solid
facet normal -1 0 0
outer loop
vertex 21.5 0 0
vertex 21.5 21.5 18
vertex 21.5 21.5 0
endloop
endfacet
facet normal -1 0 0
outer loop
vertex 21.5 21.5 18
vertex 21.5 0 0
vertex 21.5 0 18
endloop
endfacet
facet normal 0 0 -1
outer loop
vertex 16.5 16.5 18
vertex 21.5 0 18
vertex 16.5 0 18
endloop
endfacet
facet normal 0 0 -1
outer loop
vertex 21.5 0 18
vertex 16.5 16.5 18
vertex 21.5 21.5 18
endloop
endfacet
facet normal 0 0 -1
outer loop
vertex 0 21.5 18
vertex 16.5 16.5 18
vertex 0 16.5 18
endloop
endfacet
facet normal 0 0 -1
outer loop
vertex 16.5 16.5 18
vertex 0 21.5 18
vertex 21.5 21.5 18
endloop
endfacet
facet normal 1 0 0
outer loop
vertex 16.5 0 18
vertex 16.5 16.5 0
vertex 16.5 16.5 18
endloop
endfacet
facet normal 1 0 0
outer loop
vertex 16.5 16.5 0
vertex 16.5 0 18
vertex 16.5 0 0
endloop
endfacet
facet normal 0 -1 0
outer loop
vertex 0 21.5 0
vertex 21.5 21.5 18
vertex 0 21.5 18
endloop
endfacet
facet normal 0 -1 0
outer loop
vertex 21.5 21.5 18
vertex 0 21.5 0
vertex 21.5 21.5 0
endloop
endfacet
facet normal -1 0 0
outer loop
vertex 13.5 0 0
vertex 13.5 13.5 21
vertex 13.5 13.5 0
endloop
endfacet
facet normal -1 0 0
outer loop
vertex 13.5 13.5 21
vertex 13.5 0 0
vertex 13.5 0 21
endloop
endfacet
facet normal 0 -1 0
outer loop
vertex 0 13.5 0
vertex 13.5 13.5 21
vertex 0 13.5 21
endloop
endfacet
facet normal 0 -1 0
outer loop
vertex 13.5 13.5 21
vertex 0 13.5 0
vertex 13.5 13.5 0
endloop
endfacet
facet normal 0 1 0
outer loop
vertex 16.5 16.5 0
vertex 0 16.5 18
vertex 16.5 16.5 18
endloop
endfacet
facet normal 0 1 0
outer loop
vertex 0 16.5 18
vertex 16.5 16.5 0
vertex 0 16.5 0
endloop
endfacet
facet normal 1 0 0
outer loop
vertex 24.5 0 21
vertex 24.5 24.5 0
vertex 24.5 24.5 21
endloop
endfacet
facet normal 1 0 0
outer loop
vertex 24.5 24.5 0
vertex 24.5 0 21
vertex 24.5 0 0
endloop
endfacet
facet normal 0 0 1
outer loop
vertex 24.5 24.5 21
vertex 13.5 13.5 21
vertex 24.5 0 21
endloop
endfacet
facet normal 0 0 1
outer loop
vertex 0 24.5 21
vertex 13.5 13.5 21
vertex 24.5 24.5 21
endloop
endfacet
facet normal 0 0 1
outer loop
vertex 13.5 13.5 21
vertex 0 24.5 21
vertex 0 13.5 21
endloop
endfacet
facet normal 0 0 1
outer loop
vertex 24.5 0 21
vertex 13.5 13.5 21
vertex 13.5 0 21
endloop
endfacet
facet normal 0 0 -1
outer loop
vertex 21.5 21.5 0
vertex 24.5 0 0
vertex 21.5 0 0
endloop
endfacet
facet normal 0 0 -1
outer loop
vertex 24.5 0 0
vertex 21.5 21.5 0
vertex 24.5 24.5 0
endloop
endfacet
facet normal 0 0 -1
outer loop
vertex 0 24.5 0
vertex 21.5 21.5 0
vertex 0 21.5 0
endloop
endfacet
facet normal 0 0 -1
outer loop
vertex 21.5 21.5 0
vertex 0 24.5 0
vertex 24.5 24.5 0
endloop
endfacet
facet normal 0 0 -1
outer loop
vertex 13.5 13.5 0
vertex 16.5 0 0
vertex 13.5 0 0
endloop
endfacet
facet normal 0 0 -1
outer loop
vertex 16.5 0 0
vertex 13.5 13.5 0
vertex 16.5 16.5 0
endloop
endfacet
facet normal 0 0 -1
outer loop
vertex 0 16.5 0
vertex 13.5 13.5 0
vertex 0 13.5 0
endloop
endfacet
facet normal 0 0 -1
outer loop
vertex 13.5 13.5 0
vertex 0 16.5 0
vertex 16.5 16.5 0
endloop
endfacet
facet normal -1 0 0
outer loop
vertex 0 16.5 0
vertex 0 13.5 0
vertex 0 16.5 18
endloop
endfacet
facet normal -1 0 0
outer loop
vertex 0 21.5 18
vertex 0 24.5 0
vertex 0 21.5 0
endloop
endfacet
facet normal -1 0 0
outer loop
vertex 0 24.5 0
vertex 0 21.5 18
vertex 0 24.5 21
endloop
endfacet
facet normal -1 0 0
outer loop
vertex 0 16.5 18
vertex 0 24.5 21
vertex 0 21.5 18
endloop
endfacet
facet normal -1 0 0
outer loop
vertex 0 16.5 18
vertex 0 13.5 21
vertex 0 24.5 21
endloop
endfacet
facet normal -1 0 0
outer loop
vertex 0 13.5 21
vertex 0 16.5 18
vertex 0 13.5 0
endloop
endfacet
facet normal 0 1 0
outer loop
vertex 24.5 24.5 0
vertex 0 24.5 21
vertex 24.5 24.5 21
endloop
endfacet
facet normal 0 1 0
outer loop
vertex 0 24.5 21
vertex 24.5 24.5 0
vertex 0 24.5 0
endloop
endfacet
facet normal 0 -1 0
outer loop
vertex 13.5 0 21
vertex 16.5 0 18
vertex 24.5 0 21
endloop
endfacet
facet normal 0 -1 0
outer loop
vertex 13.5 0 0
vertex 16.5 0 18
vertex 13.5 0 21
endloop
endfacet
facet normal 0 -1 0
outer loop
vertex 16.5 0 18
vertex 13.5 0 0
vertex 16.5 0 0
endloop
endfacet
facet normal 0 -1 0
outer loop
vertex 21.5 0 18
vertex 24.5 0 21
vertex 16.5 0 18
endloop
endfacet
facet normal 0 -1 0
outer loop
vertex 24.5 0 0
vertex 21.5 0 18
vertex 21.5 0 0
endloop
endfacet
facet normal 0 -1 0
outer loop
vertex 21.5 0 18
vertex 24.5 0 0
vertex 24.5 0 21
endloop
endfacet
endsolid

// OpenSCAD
/* "L" Panel connector generator by Llorenç Garcia 16/10/2024, https://github.com/Siot
 *
 * Licensing: 
 * This user content is licensed under a
Creative Commons Attribution-Noncommercial-Share Alike (https://creativecommons.org/licenses/by-nc-sa/4.0/)
*/

innerDuctWidth = 5;
outerArmLength = 13.5;
wallThickness = 3;
innerWallHeight = 18;

/* [Hidden] */
fullLength = outerArmLength + wallThickness + innerDuctWidth + wallThickness;
fullHeight = innerWallHeight + wallThickness;

difference() {
    
    cube([fullLength,fullLength, fullHeight]);

    union() {
            translate([outerArmLength + wallThickness, -1, -1]) {
            cube([innerDuctWidth, fullLength-wallThickness+1, innerWallHeight+1]);
        }
        
        translate([-1, -1, -1]) {
            cube([outerArmLength+1,outerArmLength+1,fullHeight+2]);
        }
        
        translate([-1, outerArmLength+wallThickness, -1]) {
            cube([fullLength-wallThickness+1,innerDuctWidth,innerWallHeight+1]);
        }
        
    }
}
